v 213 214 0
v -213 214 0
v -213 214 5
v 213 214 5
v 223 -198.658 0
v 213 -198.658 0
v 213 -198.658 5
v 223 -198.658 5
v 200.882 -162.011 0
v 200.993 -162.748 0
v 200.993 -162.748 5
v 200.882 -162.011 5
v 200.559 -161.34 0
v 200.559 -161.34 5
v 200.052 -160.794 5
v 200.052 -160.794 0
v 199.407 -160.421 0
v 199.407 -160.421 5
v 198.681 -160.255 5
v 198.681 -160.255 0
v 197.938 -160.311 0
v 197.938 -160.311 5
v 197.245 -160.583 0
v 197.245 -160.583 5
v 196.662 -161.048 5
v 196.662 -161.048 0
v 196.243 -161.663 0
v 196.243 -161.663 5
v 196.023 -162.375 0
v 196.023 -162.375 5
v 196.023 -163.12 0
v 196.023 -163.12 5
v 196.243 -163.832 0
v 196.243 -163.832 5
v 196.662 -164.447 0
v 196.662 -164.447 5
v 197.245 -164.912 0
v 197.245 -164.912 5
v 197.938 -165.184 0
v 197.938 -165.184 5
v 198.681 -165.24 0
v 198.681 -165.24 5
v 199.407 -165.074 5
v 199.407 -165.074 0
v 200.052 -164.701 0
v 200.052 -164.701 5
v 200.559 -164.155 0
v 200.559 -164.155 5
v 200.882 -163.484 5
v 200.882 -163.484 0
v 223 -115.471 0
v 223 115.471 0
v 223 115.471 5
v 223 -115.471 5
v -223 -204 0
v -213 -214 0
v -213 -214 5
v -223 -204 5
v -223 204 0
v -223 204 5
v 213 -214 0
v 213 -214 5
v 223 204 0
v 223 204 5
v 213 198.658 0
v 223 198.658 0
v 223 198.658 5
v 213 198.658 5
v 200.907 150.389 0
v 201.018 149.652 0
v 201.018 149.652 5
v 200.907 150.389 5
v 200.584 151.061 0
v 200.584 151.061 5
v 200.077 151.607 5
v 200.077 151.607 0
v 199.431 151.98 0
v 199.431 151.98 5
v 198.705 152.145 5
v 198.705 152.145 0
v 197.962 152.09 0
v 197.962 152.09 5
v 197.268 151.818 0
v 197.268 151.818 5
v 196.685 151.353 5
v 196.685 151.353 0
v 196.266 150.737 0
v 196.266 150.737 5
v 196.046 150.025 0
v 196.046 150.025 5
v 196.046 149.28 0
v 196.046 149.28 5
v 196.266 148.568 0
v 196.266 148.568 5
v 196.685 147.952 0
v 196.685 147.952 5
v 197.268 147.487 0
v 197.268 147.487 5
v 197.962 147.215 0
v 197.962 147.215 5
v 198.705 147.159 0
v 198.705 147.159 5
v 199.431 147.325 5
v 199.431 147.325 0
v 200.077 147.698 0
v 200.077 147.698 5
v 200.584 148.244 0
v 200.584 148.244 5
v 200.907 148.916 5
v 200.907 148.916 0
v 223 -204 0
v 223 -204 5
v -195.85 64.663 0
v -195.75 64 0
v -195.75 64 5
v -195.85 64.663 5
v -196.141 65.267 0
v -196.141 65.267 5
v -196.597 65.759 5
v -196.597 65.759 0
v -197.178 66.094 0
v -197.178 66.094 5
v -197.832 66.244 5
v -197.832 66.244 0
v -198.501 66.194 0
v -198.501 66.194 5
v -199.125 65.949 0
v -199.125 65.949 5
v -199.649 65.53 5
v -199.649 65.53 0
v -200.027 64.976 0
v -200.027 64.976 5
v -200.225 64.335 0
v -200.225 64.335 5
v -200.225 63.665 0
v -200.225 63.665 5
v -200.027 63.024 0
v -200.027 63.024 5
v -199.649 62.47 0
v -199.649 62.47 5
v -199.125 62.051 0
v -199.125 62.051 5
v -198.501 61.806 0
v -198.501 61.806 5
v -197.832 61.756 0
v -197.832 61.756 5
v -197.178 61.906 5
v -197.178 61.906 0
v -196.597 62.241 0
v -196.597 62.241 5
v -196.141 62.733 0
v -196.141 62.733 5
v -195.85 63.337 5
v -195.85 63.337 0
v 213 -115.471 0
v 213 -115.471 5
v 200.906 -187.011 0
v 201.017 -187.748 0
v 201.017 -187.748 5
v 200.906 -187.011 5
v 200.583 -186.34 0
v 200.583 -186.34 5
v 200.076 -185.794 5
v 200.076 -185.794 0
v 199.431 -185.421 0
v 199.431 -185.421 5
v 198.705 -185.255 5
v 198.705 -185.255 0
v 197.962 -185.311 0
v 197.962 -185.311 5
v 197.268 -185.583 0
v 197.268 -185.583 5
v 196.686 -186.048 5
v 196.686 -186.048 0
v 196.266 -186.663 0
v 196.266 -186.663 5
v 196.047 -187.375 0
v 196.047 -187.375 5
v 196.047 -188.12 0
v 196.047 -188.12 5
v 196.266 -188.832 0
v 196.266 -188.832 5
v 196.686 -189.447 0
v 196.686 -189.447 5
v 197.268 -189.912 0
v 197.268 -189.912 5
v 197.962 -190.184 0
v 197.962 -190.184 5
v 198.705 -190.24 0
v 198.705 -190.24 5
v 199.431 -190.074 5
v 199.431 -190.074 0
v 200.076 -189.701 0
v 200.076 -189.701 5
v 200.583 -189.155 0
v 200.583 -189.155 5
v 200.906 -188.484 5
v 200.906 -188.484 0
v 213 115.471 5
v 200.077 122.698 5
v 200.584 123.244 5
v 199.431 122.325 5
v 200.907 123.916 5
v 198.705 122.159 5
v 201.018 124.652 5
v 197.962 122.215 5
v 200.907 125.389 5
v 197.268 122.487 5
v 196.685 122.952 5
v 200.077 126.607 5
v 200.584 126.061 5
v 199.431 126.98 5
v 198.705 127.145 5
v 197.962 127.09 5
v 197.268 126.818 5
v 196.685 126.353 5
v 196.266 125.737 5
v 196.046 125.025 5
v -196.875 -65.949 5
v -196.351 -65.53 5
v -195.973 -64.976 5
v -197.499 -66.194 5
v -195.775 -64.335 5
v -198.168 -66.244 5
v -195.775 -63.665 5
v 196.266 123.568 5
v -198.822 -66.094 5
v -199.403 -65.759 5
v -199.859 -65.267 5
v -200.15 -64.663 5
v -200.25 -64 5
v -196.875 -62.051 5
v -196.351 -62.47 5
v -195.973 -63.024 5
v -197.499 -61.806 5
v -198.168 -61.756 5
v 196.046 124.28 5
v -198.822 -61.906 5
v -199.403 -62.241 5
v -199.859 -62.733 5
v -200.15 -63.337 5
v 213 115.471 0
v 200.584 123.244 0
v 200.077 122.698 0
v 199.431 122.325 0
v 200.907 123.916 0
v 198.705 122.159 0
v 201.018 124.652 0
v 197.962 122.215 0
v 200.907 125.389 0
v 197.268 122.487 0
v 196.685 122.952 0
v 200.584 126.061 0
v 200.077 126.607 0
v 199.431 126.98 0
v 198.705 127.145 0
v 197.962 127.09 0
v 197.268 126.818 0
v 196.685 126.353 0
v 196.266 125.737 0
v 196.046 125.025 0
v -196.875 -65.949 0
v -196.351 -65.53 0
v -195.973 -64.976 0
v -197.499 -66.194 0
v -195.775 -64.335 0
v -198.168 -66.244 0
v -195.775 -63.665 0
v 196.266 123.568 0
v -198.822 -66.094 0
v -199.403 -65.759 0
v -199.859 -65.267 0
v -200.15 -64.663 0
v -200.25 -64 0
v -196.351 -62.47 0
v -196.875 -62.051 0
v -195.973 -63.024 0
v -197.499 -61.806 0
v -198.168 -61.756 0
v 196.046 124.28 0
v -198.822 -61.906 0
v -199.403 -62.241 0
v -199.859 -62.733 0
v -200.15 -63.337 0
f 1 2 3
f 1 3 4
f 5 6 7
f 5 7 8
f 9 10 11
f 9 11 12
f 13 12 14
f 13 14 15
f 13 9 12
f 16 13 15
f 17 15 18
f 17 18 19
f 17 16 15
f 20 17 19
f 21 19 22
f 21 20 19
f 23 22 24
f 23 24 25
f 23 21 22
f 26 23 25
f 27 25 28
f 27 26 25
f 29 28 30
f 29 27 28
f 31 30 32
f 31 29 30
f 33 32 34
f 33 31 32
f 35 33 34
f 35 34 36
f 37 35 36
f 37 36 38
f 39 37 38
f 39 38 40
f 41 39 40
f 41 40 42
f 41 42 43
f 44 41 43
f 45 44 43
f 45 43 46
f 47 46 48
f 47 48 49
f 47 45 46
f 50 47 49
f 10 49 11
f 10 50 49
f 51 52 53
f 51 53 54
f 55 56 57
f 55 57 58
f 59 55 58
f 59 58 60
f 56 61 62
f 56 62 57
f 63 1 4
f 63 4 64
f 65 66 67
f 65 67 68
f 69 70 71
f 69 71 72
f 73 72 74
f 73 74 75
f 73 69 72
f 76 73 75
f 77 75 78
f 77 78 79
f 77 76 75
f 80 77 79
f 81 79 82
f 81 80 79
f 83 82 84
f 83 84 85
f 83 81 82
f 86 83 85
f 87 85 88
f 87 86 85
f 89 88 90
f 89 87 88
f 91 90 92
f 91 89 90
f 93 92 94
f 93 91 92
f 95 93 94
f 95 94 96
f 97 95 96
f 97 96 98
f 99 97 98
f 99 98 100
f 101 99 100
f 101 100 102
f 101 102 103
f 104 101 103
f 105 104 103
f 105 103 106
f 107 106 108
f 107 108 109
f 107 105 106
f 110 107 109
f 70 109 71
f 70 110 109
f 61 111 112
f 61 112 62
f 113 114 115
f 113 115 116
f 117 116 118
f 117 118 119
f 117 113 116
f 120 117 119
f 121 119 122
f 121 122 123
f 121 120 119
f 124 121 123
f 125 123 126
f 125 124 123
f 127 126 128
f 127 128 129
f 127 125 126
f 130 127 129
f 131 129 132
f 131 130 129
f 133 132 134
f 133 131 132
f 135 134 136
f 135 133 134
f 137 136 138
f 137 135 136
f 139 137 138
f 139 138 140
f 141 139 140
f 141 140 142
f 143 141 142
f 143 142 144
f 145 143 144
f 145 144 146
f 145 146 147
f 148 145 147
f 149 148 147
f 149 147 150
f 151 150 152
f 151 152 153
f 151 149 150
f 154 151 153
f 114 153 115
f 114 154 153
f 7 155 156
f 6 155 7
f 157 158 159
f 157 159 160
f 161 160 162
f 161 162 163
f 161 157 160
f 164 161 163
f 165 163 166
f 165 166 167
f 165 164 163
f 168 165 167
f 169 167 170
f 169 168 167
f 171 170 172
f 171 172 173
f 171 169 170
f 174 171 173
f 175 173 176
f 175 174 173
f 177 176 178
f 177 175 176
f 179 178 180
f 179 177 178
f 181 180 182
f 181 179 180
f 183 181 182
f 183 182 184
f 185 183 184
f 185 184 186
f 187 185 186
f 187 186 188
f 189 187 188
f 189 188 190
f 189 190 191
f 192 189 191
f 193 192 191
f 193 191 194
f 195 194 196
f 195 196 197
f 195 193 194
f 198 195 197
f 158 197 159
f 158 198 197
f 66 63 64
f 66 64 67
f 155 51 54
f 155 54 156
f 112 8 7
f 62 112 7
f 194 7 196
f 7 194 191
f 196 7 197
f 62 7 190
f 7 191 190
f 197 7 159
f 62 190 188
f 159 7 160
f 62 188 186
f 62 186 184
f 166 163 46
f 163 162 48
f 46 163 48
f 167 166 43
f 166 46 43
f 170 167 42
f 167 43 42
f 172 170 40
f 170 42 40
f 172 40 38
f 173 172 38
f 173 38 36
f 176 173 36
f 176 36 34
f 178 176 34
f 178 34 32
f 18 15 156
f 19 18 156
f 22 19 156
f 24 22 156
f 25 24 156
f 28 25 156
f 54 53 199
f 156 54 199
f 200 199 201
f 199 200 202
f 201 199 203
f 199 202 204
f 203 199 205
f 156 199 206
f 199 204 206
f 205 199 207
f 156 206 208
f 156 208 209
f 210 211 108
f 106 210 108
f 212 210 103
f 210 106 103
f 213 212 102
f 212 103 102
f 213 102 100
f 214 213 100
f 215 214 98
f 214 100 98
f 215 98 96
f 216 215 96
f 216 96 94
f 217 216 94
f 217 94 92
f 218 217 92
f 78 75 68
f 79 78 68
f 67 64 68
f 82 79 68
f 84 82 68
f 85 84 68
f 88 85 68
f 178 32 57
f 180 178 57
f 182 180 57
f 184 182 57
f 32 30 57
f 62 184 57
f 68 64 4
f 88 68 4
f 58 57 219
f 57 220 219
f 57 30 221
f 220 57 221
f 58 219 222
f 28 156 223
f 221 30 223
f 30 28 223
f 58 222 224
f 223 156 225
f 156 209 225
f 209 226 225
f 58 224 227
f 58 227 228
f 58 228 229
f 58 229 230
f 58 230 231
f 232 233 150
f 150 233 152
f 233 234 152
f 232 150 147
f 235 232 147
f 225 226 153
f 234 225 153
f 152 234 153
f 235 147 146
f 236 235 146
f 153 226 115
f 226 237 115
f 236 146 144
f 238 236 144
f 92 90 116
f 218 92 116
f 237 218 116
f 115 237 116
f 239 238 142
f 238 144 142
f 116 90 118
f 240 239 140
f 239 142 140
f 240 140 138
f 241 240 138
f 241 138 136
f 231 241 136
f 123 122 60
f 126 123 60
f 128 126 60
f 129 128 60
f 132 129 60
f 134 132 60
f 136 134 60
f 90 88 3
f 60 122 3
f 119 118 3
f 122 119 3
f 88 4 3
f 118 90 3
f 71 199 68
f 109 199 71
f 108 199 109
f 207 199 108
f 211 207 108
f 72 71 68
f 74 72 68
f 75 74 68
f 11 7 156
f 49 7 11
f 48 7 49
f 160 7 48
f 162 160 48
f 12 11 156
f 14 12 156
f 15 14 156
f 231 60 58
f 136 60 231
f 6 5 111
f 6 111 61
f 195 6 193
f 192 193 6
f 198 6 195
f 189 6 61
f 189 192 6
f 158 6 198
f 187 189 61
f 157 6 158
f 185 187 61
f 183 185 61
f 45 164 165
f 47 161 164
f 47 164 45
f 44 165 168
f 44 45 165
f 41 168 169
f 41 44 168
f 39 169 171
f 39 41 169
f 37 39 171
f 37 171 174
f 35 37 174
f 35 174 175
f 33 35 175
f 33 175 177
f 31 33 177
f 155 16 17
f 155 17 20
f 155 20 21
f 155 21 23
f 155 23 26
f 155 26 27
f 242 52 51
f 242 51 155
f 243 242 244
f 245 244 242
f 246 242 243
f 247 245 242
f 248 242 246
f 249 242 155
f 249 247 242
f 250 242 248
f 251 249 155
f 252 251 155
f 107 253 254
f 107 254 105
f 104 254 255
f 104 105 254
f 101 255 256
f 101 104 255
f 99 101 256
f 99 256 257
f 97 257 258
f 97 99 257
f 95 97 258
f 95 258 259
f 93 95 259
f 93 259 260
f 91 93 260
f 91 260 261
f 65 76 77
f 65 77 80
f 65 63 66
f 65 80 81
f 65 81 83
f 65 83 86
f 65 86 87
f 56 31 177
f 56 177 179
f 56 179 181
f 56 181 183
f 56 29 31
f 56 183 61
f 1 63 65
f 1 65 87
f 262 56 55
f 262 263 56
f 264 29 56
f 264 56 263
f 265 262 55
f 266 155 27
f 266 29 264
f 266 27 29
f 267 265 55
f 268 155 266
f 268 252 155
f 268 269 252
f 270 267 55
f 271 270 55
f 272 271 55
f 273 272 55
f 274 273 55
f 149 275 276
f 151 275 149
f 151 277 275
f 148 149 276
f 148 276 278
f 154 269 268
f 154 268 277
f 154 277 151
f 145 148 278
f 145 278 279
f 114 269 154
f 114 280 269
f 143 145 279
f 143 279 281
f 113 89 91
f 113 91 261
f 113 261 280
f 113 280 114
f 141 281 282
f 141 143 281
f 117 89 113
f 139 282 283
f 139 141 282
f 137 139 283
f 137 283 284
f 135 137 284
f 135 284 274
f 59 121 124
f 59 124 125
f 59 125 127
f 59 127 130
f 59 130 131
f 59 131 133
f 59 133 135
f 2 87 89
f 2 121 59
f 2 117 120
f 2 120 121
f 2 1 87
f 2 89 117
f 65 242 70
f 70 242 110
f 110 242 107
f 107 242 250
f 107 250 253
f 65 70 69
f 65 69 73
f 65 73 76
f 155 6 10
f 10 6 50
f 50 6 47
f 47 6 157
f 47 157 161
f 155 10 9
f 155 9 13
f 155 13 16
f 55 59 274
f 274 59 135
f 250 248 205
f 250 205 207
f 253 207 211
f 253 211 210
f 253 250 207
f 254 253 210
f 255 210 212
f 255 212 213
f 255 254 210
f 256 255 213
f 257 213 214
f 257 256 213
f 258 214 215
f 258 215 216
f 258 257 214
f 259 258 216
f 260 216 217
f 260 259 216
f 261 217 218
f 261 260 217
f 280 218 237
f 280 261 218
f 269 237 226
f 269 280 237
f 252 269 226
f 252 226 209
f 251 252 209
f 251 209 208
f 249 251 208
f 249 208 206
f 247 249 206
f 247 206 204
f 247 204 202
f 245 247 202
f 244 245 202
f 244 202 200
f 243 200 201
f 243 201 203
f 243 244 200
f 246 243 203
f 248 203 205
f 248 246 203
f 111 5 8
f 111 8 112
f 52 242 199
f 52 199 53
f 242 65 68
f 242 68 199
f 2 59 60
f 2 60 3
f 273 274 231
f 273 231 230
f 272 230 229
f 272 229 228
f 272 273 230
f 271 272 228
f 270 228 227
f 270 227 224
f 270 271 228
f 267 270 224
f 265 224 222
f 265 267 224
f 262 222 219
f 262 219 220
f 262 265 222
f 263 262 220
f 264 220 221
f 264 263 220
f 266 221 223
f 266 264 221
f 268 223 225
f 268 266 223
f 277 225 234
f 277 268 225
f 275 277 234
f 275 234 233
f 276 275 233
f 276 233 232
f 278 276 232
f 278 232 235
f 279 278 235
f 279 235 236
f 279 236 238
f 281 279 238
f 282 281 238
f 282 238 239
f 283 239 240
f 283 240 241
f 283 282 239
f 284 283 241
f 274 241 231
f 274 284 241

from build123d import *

# Parameters (mm, degrees)
SCHIZZO1_R                   = 2.5
SCHIZZO1_R_2                 = 2.499072061
SCHIZZO1_R_3                 = 2.25
ESTRUSIONE_ESTRUSIONE1_DEPTH = 5


with BuildPart() as part:
    # Schizzo1 → Estrusione-Estrusione1 (new body)
    with BuildSketch(Plane.XY):
        Polygon((-223, 204), (-213, 214), (213, 214), (223, 204), (223, 198.658355402), (213, 198.658355402), (213, 115.470714491), (223, 115.470714491), (223, -115.470714491), (213, -115.470714491), (213, -198.658355402), (223, -198.658355402), (223, -204), (213, -214), (-213, -214), (-223, -204), align=None)
        with Locations((198.51797805, 149.65244957)):
            Circle(SCHIZZO1_R, mode=Mode.SUBTRACT)
        with Locations((198.51797805, 124.65244957)):
            Circle(SCHIZZO1_R, mode=Mode.SUBTRACT)
        with Locations((198.494140307, -162.747561795)):
            Circle(SCHIZZO1_R_2, mode=Mode.SUBTRACT)
        with Locations((198.51797805, -187.74755043)):
            Circle(SCHIZZO1_R_2, mode=Mode.SUBTRACT)
        with Locations((-198, 64)):
            Circle(SCHIZZO1_R_3, mode=Mode.SUBTRACT)
        with Locations(Location((-198, -64, 0), (0, 0, 180))):
            Circle(SCHIZZO1_R_3, mode=Mode.SUBTRACT)
    extrude(amount=ESTRUSIONE_ESTRUSIONE1_DEPTH)


solid = part.part
